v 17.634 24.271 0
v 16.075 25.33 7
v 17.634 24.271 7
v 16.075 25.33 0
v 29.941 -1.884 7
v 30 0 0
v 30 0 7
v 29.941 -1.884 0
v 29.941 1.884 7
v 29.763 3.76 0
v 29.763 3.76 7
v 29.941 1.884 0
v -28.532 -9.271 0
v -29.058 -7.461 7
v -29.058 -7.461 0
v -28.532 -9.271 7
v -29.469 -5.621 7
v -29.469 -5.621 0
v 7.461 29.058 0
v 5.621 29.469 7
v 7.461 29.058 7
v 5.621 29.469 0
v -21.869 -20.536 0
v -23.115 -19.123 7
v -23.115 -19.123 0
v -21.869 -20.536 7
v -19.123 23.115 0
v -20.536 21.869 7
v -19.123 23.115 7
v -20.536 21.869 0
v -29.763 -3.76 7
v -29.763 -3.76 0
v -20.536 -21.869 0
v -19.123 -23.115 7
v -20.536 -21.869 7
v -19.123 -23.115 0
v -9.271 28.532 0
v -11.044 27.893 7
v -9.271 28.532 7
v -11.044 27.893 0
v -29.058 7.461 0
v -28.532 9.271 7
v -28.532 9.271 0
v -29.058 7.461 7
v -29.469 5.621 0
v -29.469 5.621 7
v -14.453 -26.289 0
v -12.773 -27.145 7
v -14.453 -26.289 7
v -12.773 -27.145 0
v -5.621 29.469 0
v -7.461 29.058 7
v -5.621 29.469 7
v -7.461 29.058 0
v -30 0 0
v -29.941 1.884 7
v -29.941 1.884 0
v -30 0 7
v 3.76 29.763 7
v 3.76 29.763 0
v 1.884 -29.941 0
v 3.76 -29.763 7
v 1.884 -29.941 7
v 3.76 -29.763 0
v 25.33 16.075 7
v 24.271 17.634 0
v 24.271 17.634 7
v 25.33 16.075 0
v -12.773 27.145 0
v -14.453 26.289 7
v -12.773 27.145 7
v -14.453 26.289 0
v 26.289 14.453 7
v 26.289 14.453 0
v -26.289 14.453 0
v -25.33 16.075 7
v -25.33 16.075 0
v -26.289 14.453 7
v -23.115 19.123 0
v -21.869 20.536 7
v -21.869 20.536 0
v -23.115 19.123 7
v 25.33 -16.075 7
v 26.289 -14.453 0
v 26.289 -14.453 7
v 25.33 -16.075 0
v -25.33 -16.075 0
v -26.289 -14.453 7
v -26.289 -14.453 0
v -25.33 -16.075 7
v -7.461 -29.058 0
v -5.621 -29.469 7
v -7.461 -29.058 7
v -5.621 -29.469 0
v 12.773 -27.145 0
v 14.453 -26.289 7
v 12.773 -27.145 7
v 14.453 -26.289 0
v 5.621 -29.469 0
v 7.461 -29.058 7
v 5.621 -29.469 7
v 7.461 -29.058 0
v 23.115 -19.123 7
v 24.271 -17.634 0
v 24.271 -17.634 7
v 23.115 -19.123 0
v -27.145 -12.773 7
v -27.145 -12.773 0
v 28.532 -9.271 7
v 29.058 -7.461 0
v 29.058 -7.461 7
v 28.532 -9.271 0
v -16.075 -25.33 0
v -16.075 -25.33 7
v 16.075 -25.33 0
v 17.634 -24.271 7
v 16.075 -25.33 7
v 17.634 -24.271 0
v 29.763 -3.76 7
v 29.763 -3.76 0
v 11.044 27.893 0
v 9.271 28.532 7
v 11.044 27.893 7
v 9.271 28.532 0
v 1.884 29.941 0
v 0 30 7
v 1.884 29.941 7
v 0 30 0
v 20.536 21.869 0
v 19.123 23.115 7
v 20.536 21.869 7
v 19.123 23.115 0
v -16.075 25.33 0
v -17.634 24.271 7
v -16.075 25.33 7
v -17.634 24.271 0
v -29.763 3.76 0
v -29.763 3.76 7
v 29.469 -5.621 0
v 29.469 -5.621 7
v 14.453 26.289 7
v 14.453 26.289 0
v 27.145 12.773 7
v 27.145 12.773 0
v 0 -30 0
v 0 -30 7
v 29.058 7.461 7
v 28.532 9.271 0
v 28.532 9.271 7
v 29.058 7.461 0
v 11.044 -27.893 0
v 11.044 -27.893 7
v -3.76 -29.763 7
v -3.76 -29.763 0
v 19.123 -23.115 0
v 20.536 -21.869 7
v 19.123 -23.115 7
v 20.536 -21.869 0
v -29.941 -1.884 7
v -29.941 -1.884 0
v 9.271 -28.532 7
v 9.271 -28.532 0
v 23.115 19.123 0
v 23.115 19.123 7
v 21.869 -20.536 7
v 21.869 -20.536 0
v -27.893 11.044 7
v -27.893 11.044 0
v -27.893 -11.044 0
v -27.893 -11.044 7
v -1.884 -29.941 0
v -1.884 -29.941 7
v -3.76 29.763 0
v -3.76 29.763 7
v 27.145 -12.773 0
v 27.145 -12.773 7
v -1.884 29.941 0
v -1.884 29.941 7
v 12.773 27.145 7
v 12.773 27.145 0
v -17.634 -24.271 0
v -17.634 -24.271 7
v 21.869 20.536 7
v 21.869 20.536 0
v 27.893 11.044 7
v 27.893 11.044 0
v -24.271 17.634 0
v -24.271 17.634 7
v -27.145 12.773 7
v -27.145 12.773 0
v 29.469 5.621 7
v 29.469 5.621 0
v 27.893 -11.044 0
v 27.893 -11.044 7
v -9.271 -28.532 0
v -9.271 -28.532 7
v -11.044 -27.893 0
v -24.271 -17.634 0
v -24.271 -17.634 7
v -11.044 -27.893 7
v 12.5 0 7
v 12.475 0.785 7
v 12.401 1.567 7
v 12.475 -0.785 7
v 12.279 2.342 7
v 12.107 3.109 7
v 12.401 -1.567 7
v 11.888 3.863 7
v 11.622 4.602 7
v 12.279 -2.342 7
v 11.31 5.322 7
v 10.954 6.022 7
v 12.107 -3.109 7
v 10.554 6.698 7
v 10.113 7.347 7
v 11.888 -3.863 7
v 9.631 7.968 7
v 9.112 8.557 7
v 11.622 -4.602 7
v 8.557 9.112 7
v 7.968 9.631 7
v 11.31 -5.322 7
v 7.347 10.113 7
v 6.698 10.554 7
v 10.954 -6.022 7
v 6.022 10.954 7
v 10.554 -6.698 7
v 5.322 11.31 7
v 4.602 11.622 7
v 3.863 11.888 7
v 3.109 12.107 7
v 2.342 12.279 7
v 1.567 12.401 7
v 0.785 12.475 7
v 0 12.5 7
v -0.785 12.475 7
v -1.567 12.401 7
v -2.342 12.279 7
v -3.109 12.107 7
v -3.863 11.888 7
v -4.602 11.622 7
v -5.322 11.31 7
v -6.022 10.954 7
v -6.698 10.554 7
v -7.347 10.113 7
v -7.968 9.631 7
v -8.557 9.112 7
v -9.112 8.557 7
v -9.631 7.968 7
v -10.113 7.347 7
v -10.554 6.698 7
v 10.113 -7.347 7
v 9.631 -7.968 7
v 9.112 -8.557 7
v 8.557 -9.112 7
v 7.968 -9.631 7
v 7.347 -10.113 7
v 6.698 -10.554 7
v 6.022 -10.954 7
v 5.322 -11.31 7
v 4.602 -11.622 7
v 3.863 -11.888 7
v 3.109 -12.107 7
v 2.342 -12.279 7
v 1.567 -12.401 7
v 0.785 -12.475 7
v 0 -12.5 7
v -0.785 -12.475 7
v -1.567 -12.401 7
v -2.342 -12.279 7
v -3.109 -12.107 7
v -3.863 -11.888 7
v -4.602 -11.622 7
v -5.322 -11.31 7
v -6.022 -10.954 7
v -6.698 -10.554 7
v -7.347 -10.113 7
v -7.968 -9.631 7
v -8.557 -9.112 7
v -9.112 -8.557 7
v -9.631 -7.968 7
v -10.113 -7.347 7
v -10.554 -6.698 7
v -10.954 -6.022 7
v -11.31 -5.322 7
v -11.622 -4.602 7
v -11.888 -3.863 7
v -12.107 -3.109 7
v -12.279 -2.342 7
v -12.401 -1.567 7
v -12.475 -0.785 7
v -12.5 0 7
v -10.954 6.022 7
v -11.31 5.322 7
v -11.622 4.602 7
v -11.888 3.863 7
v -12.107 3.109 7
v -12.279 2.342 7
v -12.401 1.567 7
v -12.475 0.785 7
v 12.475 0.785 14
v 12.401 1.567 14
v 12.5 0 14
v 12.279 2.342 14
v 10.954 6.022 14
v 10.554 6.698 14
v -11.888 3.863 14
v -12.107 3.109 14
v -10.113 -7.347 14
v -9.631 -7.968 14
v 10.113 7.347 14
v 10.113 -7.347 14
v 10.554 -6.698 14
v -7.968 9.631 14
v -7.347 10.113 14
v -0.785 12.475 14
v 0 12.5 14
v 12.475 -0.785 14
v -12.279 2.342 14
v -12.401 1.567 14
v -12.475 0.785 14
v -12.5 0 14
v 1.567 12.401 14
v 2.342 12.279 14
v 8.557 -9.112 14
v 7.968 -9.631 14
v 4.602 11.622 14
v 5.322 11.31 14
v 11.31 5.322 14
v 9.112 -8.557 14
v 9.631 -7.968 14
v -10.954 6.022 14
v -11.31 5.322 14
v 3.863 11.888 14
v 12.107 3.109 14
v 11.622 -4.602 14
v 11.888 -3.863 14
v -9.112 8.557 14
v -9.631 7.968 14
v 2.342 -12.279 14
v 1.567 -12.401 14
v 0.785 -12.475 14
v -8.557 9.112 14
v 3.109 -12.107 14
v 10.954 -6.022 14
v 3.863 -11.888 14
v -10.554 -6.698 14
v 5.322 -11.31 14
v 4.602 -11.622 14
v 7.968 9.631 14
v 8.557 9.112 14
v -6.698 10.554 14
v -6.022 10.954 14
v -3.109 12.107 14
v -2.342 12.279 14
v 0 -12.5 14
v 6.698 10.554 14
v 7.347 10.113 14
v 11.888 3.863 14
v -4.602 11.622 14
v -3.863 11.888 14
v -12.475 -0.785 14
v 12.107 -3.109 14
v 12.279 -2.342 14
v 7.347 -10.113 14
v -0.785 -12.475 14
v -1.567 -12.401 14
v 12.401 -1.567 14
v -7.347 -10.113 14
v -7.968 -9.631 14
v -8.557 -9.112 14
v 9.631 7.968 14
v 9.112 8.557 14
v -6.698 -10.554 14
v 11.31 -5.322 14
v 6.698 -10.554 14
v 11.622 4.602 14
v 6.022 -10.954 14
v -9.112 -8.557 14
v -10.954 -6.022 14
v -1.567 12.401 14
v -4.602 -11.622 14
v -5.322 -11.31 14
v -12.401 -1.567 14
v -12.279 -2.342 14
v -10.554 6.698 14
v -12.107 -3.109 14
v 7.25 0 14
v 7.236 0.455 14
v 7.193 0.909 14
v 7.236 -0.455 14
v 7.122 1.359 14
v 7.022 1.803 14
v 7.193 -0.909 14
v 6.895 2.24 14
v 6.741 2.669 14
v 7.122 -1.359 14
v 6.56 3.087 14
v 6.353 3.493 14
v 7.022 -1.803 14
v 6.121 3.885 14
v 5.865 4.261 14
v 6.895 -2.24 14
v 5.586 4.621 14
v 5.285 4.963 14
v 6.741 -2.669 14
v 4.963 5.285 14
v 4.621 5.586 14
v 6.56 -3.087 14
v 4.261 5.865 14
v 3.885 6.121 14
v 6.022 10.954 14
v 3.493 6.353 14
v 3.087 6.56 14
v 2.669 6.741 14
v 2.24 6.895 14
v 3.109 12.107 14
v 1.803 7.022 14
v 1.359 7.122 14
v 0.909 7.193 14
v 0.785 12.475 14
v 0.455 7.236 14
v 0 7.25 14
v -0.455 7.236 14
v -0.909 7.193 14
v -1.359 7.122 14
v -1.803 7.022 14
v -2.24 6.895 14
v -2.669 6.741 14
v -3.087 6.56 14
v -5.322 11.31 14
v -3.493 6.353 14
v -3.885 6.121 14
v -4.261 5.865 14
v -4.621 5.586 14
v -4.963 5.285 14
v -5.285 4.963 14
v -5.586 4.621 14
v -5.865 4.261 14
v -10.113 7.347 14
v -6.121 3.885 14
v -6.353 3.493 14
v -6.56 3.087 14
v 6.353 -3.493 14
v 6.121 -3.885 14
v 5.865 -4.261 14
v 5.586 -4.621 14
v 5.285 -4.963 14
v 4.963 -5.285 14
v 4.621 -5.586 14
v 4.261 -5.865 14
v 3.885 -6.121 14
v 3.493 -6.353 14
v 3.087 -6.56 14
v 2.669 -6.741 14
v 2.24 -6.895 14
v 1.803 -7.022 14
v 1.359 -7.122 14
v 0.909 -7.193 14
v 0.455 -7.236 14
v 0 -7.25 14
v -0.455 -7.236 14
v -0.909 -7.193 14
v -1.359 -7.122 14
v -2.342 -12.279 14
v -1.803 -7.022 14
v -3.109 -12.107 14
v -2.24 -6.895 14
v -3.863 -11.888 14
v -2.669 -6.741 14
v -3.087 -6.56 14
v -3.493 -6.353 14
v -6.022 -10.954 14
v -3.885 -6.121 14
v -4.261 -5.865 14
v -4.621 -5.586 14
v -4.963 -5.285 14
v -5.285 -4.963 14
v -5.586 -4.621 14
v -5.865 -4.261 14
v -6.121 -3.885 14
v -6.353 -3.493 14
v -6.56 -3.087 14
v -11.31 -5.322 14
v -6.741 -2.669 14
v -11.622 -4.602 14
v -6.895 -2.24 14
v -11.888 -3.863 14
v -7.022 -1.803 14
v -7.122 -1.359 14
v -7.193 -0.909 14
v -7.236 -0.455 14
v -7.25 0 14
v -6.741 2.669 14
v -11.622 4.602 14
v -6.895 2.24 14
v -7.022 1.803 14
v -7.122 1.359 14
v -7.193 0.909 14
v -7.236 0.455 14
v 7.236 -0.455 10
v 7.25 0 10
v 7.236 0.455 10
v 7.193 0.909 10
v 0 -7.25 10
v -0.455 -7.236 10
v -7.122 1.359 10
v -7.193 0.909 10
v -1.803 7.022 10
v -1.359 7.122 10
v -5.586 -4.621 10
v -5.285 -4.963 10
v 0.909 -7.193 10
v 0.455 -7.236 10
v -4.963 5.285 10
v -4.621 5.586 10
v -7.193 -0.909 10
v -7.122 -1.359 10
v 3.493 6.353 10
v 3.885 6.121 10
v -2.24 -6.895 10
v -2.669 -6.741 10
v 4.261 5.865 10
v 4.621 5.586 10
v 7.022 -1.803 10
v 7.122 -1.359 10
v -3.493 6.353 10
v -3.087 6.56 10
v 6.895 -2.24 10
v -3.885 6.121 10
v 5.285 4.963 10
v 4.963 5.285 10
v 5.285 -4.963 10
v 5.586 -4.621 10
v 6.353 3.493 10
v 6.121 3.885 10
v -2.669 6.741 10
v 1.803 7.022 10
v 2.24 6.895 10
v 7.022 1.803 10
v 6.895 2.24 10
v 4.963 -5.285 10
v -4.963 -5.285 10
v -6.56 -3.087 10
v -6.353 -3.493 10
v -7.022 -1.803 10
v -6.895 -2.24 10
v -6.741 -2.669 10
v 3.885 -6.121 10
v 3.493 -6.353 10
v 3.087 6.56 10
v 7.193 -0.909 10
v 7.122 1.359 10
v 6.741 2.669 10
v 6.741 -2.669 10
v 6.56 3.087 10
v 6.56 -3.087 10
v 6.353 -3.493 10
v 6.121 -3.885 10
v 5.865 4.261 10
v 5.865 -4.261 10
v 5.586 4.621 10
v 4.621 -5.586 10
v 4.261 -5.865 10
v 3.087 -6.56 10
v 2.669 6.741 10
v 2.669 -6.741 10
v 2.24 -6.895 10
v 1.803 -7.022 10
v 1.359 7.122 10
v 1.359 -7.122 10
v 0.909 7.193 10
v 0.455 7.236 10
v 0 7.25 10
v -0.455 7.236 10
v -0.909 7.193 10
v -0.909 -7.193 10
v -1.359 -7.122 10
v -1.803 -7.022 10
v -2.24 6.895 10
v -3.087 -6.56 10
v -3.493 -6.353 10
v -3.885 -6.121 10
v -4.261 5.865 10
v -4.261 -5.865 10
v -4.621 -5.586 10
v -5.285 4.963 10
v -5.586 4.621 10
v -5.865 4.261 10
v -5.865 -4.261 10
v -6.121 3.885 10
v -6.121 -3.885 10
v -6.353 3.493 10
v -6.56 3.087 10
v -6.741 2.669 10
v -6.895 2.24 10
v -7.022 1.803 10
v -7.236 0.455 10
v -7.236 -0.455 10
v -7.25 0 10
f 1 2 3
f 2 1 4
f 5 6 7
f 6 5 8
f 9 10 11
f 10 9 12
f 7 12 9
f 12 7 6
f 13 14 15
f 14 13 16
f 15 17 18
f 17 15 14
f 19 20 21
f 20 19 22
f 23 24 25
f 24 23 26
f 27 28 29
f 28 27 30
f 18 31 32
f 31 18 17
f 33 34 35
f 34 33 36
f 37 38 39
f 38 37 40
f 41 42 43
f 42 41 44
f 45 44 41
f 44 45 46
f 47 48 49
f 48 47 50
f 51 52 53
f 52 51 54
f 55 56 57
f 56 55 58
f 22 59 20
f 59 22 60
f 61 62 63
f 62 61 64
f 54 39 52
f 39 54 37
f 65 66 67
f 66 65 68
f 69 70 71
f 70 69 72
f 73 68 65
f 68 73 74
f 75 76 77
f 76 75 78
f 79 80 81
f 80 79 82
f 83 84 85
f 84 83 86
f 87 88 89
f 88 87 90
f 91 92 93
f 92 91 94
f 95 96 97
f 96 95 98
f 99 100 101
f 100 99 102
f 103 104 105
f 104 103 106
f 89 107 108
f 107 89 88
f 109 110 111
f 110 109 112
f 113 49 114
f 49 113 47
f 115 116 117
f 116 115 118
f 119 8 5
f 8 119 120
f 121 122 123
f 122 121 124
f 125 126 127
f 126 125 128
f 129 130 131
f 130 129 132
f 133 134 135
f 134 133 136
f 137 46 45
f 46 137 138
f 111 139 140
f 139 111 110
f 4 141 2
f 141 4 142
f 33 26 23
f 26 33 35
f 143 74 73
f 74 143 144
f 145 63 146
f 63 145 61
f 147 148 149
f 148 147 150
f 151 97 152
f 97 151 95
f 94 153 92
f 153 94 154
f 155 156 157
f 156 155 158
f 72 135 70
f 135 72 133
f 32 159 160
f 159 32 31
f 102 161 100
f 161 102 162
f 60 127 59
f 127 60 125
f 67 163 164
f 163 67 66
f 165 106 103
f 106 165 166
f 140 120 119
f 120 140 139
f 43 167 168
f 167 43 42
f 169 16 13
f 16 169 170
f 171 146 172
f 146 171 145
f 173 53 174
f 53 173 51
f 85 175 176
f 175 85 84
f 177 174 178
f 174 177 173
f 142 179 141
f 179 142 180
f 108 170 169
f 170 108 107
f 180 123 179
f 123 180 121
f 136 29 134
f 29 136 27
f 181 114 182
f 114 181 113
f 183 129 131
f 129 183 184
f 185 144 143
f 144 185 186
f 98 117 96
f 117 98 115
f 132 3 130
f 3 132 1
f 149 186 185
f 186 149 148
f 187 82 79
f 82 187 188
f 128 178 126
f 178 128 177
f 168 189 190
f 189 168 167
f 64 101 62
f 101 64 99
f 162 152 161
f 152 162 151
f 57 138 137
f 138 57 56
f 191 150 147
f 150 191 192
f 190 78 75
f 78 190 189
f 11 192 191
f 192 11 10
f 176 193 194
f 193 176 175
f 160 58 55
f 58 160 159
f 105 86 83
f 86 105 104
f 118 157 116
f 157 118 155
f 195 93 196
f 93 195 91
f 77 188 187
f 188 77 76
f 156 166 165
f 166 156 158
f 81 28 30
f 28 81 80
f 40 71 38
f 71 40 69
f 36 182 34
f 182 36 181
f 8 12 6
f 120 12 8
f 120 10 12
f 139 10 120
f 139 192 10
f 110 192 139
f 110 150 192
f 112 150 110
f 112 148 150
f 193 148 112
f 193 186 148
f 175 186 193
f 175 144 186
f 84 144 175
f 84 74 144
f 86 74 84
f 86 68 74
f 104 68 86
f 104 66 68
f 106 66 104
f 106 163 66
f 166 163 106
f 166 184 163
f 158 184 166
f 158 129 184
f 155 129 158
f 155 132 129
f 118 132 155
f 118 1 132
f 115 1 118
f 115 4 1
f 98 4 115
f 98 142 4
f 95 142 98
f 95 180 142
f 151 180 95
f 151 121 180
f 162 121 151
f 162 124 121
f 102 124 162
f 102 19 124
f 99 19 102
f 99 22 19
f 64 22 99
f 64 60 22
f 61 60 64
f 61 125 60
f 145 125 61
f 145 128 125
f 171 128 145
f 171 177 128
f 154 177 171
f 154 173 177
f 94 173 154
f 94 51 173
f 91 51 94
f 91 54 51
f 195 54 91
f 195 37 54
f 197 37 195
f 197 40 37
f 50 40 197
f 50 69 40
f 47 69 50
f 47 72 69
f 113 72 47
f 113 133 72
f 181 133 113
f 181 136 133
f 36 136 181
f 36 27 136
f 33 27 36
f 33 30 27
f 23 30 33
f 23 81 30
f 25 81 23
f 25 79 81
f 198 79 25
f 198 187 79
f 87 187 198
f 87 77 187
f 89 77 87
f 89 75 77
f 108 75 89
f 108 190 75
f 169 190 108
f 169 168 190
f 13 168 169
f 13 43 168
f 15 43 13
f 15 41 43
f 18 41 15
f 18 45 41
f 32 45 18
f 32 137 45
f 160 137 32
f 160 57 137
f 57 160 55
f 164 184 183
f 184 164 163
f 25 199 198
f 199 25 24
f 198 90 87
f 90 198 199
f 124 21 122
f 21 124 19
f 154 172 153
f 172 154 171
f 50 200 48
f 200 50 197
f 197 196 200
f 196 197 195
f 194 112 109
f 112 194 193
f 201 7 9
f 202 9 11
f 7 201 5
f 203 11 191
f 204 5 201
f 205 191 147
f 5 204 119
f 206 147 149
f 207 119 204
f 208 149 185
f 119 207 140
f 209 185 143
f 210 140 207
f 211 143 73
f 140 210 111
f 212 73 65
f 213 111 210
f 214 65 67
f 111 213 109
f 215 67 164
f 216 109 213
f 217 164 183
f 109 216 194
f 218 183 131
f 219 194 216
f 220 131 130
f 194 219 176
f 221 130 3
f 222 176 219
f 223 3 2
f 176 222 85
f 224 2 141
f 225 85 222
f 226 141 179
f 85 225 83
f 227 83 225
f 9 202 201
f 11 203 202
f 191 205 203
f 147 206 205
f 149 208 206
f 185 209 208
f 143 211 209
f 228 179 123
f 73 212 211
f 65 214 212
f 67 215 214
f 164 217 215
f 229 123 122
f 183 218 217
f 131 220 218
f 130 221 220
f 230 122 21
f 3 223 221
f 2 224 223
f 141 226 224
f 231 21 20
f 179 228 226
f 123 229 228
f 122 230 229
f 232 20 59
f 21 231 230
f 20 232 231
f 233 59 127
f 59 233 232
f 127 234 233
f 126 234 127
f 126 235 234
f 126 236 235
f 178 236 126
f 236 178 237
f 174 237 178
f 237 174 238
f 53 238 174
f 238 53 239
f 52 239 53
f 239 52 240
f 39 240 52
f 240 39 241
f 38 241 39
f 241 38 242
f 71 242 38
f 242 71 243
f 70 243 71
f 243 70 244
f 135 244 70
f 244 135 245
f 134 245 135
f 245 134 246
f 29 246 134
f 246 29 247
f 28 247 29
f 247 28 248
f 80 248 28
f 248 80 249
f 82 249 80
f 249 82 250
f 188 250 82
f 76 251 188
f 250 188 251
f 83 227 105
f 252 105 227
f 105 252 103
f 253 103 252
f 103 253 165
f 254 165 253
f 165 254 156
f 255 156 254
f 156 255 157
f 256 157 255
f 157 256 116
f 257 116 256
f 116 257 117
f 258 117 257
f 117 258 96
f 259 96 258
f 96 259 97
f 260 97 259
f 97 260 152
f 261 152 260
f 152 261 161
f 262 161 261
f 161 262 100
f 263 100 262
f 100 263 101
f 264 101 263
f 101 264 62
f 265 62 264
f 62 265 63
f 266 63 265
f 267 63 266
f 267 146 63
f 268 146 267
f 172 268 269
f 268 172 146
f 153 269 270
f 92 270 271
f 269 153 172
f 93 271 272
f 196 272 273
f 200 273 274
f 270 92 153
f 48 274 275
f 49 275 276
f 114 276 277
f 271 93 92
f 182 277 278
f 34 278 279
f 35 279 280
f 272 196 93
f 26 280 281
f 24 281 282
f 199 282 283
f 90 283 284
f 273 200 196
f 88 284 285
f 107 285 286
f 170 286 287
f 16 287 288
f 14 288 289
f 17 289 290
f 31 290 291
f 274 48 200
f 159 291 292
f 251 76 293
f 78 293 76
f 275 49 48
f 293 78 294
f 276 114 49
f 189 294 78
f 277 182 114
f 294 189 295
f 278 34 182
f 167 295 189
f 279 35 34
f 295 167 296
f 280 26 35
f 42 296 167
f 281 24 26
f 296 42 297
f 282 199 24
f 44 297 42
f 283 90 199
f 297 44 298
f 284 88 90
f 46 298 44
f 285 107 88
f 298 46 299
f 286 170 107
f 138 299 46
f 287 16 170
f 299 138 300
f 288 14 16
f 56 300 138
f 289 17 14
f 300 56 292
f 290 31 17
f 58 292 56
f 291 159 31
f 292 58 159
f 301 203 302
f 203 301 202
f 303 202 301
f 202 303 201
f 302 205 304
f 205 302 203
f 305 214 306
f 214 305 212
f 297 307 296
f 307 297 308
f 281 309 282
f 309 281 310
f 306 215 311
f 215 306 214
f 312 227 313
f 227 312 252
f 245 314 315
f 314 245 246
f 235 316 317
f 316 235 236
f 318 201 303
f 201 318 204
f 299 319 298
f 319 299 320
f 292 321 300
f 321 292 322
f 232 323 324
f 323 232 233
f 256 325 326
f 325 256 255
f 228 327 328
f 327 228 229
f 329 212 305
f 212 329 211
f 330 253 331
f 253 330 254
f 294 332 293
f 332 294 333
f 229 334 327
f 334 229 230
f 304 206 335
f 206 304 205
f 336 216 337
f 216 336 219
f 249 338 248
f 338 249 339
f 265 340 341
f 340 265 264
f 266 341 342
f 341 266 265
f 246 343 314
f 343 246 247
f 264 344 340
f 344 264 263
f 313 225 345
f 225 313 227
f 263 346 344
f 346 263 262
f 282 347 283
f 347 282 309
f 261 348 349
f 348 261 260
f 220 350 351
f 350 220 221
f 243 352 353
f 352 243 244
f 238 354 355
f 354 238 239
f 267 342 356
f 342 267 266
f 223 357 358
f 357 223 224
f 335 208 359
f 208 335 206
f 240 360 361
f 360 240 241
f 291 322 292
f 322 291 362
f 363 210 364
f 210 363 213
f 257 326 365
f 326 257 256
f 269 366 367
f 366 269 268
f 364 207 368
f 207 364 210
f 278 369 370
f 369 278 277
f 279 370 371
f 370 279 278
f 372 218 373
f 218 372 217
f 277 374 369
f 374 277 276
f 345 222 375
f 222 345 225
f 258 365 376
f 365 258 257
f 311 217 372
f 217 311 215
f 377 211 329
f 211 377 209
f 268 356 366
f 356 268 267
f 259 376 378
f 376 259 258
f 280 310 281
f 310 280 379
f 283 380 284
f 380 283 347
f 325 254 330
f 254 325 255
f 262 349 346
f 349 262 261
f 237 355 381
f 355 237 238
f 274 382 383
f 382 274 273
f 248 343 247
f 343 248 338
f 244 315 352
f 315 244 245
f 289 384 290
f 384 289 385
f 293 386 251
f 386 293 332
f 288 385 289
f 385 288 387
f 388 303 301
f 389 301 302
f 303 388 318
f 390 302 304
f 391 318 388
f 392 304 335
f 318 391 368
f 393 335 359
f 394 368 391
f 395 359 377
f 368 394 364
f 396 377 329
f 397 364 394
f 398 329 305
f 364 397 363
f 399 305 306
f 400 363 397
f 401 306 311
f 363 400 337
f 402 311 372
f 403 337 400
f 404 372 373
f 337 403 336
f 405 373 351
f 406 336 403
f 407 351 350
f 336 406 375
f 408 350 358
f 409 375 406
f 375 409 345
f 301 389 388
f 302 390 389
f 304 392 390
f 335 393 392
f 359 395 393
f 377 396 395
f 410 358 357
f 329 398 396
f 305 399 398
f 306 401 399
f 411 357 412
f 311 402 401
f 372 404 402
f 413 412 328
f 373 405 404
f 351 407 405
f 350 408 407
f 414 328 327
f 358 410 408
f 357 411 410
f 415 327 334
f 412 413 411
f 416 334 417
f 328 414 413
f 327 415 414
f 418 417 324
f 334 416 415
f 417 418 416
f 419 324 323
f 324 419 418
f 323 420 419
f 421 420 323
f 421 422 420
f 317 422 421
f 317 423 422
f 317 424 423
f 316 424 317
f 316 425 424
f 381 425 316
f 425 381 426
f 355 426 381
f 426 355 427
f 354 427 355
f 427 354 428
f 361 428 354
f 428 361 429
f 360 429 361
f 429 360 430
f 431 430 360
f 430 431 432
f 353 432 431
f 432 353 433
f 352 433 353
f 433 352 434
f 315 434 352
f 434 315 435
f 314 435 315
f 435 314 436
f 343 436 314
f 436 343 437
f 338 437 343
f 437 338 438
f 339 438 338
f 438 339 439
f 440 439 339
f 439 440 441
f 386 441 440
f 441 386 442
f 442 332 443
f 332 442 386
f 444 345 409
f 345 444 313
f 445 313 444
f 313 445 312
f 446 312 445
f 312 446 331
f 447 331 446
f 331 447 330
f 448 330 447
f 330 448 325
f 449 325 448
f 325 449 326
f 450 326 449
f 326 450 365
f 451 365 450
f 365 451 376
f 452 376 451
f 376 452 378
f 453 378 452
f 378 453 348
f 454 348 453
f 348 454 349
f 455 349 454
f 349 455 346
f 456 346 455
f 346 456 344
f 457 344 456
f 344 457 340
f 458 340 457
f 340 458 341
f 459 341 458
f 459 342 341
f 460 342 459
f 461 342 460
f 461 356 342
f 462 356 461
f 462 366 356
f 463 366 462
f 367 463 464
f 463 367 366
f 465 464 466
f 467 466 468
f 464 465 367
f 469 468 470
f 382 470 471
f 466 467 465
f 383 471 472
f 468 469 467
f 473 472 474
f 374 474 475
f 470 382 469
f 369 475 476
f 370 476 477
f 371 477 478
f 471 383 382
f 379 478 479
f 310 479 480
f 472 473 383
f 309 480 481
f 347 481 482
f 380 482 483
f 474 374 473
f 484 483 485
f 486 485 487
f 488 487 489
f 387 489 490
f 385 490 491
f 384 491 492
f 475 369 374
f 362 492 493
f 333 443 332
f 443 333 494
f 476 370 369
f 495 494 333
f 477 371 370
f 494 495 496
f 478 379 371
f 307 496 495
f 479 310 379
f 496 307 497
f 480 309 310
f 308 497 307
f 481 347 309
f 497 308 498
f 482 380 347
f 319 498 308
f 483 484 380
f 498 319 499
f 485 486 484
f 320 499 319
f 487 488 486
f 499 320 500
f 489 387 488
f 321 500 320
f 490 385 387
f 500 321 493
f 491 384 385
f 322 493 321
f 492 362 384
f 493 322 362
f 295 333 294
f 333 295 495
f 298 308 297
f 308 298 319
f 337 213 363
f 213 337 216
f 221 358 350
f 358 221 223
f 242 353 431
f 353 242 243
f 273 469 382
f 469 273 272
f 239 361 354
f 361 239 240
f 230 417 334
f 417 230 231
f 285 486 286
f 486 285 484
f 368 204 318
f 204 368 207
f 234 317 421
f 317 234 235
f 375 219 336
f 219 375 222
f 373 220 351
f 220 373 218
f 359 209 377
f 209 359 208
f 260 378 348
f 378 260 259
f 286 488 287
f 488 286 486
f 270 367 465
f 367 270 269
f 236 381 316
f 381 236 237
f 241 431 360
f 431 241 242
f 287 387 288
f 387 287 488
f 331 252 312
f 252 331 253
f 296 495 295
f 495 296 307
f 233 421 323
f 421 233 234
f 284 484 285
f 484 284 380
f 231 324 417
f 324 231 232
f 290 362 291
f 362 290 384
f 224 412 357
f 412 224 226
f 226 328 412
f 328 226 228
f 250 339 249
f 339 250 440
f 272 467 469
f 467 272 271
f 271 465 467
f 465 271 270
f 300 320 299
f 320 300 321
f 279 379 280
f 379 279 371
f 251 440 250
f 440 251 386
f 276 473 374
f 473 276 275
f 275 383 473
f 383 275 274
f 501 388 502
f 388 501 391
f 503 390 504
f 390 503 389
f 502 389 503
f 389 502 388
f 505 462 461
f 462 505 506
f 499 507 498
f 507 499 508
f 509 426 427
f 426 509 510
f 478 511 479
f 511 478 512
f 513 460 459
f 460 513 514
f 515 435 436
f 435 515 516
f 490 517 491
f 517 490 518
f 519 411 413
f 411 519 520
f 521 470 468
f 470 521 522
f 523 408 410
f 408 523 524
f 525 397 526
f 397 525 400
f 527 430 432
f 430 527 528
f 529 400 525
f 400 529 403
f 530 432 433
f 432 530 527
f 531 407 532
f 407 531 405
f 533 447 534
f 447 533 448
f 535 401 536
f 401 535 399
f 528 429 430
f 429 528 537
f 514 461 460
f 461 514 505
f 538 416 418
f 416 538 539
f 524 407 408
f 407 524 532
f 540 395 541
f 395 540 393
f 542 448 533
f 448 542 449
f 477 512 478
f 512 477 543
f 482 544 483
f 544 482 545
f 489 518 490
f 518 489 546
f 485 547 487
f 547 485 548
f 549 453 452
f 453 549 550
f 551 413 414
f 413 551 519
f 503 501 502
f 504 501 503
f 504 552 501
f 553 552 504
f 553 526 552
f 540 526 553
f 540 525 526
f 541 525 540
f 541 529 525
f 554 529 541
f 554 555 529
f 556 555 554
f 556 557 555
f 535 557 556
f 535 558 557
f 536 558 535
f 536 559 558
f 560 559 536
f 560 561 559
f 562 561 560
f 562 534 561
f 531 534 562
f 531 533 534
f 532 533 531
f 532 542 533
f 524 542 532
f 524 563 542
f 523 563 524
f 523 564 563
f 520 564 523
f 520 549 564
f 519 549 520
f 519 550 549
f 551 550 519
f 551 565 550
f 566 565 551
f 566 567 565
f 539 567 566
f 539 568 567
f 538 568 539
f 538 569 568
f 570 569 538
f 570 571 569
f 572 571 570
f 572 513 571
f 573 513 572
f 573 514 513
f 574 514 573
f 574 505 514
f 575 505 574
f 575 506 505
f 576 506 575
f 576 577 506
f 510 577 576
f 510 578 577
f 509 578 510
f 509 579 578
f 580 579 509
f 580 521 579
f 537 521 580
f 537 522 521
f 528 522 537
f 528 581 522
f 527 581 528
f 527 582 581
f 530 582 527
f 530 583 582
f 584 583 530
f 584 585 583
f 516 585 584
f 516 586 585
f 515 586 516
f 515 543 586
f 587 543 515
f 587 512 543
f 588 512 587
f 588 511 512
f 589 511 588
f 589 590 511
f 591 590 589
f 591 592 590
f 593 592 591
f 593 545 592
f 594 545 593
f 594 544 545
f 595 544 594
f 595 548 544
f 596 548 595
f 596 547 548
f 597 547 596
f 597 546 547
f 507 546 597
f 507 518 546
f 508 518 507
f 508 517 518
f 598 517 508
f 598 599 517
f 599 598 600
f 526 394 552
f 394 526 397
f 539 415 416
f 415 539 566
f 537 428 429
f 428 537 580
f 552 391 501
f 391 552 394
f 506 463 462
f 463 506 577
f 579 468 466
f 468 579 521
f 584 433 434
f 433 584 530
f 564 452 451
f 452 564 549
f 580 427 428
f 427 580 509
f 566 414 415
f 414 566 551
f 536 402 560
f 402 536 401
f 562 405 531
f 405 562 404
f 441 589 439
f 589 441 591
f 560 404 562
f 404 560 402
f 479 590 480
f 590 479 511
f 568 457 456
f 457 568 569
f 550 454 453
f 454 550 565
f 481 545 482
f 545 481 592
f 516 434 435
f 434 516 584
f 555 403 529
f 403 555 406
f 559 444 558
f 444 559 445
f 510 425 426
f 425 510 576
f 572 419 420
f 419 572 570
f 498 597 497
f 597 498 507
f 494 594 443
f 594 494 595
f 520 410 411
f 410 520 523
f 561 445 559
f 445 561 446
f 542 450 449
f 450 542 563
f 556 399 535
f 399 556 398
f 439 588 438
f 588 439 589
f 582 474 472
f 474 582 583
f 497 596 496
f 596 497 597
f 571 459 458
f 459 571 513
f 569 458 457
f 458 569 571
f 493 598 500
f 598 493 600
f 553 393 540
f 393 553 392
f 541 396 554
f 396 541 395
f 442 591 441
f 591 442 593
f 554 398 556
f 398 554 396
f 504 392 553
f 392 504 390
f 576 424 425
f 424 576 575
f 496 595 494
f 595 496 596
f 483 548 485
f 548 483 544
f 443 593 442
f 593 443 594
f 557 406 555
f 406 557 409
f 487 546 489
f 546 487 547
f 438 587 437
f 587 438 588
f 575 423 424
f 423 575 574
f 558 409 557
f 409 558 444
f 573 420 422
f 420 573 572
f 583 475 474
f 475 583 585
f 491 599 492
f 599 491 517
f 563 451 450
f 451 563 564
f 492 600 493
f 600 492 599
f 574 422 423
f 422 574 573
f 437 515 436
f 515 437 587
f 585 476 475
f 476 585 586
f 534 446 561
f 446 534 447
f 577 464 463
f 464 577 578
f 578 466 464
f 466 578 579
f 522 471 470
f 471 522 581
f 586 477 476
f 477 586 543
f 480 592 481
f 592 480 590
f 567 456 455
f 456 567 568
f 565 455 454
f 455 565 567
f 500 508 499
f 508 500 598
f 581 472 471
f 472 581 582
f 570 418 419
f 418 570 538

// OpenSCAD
$fn = 100;
// all units in mm
H = 130;           // total height of press cylinder
bthickness = 5;    // thickness of base
based = 100;       // diameter of base piece
wall = 4;          // thickness of cylinder wall
boltd = 6.35;      // diameter of threaded rod being used for exo
screenh = 50;      // height of screened part
screenw = 2;       // screen gap size
numscreen = 50;    // even number of screen holes
ribw = 4;          // width of rib
numbolt = 5;       // number of bolts
screwd = 12.5;     // diameter of drive screw used
nutthickness = 10; // thickness of rim around nut

D = based - 2 * boltd * 2.3622; // outter diameter of press
h = H - bthickness;             // height of inner cylinder
d = D - 2 * wall;               // inner diameter of press
dp = d - 2;                     // outter diameter of press plunger
boltholed = 1.1111 * boltd + 1;
screenangle = 360 / (numscreen / 2);
boltangle = 360 / numbolt;
numboltribs = numbolt;
numnonboltribs = 0;
anglenonboltribs = boltangle;
plungerd = d - 2; // diameter of plunger
plungerh = 7;

module cylinders()
{

    cylinder(plungerh, d = plungerd);
    translate([ 0, 0, plungerh ]) cylinder(plungerh, d = screwd * 2);
}

module psupports()
{
    for (i = [1:numboltribs])
    {
        rotate([ 0, 0, boltangle * i ]) translate([ 0, 0, plungerh + plungerh / 4 ])
            cube([ ribw, plungerd - 4, plungerh / 2 ], center = true);
    }
}

difference()
{
    union()
    {
        cylinders();
        // psupports();
    }

    translate([ 0, 0, plungerh + 3 ]) cylinder(plungerh, d = screwd + 2);
}
